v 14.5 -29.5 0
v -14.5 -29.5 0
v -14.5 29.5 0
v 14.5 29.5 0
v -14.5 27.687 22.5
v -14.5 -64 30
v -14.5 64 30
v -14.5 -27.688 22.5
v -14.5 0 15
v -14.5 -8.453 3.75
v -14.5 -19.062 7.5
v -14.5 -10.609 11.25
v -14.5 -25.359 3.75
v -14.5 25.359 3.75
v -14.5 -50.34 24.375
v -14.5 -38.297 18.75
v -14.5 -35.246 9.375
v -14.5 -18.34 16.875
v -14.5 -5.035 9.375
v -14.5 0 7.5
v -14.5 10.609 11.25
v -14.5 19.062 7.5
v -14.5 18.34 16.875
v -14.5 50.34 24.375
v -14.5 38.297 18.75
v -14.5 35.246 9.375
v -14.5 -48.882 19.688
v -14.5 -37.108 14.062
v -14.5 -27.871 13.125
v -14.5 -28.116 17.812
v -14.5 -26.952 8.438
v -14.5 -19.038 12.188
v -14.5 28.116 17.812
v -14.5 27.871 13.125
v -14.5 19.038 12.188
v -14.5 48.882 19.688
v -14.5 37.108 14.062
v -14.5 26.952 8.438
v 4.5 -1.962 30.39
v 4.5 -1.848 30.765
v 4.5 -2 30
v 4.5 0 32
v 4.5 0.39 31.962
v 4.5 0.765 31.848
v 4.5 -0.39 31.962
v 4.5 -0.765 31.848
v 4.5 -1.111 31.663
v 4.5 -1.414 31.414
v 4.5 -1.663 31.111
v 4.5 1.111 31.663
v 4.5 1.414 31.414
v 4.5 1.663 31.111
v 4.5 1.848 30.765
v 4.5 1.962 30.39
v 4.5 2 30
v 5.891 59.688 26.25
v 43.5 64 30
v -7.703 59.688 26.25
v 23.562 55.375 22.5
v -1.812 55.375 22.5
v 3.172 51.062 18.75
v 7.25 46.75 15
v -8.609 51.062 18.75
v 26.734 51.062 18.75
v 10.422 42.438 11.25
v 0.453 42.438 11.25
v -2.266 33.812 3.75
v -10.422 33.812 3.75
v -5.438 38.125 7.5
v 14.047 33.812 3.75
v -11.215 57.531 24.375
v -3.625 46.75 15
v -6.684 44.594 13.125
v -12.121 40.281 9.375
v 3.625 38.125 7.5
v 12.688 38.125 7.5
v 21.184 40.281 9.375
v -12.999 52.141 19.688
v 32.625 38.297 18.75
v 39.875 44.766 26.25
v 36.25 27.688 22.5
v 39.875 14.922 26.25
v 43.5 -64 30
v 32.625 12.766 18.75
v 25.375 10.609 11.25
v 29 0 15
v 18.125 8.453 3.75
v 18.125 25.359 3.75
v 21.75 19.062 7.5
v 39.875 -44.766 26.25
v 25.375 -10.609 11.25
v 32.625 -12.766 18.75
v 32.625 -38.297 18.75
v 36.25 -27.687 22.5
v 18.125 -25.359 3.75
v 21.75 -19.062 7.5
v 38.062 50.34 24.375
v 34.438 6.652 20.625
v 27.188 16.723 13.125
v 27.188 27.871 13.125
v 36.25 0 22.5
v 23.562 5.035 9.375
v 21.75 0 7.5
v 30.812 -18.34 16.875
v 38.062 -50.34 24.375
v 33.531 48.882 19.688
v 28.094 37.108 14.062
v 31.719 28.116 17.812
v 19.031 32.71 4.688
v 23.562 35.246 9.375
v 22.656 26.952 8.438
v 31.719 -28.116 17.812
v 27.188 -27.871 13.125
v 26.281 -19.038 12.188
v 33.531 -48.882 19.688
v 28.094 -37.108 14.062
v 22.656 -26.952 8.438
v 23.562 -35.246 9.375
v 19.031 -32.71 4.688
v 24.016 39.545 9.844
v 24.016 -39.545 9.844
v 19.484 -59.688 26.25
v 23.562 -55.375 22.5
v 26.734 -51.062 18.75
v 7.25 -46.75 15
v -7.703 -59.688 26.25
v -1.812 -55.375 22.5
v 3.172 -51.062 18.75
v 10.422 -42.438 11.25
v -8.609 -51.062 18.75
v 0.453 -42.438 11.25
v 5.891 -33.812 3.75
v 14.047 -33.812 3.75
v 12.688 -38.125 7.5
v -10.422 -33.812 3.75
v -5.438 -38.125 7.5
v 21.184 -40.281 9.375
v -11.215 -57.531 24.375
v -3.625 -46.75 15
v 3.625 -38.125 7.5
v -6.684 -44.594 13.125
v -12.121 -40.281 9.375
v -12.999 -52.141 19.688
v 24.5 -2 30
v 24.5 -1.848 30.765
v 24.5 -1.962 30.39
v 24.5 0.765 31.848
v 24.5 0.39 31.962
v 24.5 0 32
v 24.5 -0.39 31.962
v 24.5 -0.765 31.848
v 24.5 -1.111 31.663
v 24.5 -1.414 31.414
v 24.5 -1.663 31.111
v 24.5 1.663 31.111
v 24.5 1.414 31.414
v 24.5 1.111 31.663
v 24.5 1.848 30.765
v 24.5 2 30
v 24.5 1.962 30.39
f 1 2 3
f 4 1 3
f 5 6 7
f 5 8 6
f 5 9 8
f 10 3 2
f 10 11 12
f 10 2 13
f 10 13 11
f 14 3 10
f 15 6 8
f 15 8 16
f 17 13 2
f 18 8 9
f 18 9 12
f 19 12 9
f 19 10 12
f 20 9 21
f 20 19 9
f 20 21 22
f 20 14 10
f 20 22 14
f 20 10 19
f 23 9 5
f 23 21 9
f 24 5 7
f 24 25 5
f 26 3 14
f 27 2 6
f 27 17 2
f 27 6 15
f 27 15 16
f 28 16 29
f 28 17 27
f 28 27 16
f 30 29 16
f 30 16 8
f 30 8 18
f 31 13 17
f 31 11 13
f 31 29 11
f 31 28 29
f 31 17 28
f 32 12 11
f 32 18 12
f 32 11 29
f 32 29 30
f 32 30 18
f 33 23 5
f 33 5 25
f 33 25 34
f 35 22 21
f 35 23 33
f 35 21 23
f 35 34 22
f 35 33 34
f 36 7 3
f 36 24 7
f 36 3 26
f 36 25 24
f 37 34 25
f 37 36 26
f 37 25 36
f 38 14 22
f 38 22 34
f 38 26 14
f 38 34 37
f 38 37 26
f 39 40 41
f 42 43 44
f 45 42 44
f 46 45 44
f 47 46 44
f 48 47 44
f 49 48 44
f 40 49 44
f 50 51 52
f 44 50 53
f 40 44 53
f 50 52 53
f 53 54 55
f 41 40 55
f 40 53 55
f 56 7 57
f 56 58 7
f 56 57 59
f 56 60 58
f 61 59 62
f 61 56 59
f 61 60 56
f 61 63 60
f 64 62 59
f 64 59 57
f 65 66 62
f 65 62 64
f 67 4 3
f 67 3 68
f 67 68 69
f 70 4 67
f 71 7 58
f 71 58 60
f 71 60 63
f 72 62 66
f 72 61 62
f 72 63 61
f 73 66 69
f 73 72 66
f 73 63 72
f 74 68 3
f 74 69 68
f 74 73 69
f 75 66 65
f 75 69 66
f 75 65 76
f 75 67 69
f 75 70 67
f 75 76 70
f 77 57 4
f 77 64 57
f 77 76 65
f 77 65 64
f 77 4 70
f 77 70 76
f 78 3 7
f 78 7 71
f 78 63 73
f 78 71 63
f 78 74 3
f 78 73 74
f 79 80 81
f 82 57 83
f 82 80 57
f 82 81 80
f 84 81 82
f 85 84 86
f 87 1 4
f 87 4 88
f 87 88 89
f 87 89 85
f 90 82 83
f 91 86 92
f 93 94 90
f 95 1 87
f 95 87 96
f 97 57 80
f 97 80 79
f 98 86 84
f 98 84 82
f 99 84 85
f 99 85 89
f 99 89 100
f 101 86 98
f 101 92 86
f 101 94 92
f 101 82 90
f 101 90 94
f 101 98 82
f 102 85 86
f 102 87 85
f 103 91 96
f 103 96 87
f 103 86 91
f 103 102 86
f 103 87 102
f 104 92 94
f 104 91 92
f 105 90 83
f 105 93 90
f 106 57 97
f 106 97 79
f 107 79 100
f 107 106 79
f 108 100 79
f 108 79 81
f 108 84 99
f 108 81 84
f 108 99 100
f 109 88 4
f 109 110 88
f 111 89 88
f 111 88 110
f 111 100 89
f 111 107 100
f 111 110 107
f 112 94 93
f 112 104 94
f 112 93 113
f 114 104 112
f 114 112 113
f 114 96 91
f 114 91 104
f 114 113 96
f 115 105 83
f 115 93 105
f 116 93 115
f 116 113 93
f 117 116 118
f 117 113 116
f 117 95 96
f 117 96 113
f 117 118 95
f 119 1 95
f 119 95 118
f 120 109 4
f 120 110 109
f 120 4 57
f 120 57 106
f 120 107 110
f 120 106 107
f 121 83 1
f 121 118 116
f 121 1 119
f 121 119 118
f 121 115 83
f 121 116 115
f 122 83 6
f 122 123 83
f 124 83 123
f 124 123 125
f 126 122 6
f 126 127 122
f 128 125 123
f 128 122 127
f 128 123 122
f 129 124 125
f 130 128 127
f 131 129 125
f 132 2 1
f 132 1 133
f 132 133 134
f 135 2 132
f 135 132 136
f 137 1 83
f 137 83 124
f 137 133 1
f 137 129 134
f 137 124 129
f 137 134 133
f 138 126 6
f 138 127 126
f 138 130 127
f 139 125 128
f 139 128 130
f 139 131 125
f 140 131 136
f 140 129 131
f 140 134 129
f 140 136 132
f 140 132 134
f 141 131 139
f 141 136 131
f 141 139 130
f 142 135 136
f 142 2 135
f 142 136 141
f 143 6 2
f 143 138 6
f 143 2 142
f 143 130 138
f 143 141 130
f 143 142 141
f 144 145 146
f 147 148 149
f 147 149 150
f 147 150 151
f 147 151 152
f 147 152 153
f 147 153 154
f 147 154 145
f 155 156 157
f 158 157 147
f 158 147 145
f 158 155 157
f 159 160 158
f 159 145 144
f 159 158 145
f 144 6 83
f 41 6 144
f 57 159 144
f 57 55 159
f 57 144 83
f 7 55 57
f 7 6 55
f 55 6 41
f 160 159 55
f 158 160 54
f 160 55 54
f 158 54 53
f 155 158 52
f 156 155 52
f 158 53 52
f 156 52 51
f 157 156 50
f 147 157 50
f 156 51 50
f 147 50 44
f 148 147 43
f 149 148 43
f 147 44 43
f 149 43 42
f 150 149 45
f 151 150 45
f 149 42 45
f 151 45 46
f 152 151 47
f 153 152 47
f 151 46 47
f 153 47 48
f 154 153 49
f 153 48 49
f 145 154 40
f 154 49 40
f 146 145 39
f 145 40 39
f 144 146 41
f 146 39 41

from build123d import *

# Parameters (mm, degrees)
BOSS_EXTRU_2_DEPTH      = 10
BOSS_EXTRU_2_DEPTH_BACK = 10
ESQUISSE4_R             = 2


with BuildPart() as part:
    # Esquisse2 → Lissage1 section 0
    with BuildSketch(Plane.XY.offset(30)):
        with BuildLine():
            Line((-14.5, -64), (-14.5, 64))
            Line((-14.5, 64), (43.5, 64))
            Line((43.5, 64), (43.5, -64))
            Line((43.5, -64), (-14.5, -64))
        make_face()
    # Esquisse1 → Lissage1 section 1
    with BuildSketch(Plane.XY):
        with BuildLine():
            Line((-14.5, 29.5), (14.5, 29.5))
            Line((14.5, 29.5), (14.5, -29.5))
            Line((14.5, -29.5), (-14.5, -29.5))
            Line((-14.5, -29.5), (-14.5, 29.5))
        make_face()
    loft()

    # Esquisse4 → Boss.-Extru.2 (add, two sides: drawn at the far end of the back side and taken through both)
    with BuildSketch(Plane(origin=(14.5, 0, 0), x_dir=(0, 0, -1), z_dir=(1, 0, 0)).offset(-BOSS_EXTRU_2_DEPTH_BACK)):
        with Locations((-30, 0)):
            Circle(ESQUISSE4_R)
    extrude(amount=BOSS_EXTRU_2_DEPTH + BOSS_EXTRU_2_DEPTH_BACK)


solid = part.part
